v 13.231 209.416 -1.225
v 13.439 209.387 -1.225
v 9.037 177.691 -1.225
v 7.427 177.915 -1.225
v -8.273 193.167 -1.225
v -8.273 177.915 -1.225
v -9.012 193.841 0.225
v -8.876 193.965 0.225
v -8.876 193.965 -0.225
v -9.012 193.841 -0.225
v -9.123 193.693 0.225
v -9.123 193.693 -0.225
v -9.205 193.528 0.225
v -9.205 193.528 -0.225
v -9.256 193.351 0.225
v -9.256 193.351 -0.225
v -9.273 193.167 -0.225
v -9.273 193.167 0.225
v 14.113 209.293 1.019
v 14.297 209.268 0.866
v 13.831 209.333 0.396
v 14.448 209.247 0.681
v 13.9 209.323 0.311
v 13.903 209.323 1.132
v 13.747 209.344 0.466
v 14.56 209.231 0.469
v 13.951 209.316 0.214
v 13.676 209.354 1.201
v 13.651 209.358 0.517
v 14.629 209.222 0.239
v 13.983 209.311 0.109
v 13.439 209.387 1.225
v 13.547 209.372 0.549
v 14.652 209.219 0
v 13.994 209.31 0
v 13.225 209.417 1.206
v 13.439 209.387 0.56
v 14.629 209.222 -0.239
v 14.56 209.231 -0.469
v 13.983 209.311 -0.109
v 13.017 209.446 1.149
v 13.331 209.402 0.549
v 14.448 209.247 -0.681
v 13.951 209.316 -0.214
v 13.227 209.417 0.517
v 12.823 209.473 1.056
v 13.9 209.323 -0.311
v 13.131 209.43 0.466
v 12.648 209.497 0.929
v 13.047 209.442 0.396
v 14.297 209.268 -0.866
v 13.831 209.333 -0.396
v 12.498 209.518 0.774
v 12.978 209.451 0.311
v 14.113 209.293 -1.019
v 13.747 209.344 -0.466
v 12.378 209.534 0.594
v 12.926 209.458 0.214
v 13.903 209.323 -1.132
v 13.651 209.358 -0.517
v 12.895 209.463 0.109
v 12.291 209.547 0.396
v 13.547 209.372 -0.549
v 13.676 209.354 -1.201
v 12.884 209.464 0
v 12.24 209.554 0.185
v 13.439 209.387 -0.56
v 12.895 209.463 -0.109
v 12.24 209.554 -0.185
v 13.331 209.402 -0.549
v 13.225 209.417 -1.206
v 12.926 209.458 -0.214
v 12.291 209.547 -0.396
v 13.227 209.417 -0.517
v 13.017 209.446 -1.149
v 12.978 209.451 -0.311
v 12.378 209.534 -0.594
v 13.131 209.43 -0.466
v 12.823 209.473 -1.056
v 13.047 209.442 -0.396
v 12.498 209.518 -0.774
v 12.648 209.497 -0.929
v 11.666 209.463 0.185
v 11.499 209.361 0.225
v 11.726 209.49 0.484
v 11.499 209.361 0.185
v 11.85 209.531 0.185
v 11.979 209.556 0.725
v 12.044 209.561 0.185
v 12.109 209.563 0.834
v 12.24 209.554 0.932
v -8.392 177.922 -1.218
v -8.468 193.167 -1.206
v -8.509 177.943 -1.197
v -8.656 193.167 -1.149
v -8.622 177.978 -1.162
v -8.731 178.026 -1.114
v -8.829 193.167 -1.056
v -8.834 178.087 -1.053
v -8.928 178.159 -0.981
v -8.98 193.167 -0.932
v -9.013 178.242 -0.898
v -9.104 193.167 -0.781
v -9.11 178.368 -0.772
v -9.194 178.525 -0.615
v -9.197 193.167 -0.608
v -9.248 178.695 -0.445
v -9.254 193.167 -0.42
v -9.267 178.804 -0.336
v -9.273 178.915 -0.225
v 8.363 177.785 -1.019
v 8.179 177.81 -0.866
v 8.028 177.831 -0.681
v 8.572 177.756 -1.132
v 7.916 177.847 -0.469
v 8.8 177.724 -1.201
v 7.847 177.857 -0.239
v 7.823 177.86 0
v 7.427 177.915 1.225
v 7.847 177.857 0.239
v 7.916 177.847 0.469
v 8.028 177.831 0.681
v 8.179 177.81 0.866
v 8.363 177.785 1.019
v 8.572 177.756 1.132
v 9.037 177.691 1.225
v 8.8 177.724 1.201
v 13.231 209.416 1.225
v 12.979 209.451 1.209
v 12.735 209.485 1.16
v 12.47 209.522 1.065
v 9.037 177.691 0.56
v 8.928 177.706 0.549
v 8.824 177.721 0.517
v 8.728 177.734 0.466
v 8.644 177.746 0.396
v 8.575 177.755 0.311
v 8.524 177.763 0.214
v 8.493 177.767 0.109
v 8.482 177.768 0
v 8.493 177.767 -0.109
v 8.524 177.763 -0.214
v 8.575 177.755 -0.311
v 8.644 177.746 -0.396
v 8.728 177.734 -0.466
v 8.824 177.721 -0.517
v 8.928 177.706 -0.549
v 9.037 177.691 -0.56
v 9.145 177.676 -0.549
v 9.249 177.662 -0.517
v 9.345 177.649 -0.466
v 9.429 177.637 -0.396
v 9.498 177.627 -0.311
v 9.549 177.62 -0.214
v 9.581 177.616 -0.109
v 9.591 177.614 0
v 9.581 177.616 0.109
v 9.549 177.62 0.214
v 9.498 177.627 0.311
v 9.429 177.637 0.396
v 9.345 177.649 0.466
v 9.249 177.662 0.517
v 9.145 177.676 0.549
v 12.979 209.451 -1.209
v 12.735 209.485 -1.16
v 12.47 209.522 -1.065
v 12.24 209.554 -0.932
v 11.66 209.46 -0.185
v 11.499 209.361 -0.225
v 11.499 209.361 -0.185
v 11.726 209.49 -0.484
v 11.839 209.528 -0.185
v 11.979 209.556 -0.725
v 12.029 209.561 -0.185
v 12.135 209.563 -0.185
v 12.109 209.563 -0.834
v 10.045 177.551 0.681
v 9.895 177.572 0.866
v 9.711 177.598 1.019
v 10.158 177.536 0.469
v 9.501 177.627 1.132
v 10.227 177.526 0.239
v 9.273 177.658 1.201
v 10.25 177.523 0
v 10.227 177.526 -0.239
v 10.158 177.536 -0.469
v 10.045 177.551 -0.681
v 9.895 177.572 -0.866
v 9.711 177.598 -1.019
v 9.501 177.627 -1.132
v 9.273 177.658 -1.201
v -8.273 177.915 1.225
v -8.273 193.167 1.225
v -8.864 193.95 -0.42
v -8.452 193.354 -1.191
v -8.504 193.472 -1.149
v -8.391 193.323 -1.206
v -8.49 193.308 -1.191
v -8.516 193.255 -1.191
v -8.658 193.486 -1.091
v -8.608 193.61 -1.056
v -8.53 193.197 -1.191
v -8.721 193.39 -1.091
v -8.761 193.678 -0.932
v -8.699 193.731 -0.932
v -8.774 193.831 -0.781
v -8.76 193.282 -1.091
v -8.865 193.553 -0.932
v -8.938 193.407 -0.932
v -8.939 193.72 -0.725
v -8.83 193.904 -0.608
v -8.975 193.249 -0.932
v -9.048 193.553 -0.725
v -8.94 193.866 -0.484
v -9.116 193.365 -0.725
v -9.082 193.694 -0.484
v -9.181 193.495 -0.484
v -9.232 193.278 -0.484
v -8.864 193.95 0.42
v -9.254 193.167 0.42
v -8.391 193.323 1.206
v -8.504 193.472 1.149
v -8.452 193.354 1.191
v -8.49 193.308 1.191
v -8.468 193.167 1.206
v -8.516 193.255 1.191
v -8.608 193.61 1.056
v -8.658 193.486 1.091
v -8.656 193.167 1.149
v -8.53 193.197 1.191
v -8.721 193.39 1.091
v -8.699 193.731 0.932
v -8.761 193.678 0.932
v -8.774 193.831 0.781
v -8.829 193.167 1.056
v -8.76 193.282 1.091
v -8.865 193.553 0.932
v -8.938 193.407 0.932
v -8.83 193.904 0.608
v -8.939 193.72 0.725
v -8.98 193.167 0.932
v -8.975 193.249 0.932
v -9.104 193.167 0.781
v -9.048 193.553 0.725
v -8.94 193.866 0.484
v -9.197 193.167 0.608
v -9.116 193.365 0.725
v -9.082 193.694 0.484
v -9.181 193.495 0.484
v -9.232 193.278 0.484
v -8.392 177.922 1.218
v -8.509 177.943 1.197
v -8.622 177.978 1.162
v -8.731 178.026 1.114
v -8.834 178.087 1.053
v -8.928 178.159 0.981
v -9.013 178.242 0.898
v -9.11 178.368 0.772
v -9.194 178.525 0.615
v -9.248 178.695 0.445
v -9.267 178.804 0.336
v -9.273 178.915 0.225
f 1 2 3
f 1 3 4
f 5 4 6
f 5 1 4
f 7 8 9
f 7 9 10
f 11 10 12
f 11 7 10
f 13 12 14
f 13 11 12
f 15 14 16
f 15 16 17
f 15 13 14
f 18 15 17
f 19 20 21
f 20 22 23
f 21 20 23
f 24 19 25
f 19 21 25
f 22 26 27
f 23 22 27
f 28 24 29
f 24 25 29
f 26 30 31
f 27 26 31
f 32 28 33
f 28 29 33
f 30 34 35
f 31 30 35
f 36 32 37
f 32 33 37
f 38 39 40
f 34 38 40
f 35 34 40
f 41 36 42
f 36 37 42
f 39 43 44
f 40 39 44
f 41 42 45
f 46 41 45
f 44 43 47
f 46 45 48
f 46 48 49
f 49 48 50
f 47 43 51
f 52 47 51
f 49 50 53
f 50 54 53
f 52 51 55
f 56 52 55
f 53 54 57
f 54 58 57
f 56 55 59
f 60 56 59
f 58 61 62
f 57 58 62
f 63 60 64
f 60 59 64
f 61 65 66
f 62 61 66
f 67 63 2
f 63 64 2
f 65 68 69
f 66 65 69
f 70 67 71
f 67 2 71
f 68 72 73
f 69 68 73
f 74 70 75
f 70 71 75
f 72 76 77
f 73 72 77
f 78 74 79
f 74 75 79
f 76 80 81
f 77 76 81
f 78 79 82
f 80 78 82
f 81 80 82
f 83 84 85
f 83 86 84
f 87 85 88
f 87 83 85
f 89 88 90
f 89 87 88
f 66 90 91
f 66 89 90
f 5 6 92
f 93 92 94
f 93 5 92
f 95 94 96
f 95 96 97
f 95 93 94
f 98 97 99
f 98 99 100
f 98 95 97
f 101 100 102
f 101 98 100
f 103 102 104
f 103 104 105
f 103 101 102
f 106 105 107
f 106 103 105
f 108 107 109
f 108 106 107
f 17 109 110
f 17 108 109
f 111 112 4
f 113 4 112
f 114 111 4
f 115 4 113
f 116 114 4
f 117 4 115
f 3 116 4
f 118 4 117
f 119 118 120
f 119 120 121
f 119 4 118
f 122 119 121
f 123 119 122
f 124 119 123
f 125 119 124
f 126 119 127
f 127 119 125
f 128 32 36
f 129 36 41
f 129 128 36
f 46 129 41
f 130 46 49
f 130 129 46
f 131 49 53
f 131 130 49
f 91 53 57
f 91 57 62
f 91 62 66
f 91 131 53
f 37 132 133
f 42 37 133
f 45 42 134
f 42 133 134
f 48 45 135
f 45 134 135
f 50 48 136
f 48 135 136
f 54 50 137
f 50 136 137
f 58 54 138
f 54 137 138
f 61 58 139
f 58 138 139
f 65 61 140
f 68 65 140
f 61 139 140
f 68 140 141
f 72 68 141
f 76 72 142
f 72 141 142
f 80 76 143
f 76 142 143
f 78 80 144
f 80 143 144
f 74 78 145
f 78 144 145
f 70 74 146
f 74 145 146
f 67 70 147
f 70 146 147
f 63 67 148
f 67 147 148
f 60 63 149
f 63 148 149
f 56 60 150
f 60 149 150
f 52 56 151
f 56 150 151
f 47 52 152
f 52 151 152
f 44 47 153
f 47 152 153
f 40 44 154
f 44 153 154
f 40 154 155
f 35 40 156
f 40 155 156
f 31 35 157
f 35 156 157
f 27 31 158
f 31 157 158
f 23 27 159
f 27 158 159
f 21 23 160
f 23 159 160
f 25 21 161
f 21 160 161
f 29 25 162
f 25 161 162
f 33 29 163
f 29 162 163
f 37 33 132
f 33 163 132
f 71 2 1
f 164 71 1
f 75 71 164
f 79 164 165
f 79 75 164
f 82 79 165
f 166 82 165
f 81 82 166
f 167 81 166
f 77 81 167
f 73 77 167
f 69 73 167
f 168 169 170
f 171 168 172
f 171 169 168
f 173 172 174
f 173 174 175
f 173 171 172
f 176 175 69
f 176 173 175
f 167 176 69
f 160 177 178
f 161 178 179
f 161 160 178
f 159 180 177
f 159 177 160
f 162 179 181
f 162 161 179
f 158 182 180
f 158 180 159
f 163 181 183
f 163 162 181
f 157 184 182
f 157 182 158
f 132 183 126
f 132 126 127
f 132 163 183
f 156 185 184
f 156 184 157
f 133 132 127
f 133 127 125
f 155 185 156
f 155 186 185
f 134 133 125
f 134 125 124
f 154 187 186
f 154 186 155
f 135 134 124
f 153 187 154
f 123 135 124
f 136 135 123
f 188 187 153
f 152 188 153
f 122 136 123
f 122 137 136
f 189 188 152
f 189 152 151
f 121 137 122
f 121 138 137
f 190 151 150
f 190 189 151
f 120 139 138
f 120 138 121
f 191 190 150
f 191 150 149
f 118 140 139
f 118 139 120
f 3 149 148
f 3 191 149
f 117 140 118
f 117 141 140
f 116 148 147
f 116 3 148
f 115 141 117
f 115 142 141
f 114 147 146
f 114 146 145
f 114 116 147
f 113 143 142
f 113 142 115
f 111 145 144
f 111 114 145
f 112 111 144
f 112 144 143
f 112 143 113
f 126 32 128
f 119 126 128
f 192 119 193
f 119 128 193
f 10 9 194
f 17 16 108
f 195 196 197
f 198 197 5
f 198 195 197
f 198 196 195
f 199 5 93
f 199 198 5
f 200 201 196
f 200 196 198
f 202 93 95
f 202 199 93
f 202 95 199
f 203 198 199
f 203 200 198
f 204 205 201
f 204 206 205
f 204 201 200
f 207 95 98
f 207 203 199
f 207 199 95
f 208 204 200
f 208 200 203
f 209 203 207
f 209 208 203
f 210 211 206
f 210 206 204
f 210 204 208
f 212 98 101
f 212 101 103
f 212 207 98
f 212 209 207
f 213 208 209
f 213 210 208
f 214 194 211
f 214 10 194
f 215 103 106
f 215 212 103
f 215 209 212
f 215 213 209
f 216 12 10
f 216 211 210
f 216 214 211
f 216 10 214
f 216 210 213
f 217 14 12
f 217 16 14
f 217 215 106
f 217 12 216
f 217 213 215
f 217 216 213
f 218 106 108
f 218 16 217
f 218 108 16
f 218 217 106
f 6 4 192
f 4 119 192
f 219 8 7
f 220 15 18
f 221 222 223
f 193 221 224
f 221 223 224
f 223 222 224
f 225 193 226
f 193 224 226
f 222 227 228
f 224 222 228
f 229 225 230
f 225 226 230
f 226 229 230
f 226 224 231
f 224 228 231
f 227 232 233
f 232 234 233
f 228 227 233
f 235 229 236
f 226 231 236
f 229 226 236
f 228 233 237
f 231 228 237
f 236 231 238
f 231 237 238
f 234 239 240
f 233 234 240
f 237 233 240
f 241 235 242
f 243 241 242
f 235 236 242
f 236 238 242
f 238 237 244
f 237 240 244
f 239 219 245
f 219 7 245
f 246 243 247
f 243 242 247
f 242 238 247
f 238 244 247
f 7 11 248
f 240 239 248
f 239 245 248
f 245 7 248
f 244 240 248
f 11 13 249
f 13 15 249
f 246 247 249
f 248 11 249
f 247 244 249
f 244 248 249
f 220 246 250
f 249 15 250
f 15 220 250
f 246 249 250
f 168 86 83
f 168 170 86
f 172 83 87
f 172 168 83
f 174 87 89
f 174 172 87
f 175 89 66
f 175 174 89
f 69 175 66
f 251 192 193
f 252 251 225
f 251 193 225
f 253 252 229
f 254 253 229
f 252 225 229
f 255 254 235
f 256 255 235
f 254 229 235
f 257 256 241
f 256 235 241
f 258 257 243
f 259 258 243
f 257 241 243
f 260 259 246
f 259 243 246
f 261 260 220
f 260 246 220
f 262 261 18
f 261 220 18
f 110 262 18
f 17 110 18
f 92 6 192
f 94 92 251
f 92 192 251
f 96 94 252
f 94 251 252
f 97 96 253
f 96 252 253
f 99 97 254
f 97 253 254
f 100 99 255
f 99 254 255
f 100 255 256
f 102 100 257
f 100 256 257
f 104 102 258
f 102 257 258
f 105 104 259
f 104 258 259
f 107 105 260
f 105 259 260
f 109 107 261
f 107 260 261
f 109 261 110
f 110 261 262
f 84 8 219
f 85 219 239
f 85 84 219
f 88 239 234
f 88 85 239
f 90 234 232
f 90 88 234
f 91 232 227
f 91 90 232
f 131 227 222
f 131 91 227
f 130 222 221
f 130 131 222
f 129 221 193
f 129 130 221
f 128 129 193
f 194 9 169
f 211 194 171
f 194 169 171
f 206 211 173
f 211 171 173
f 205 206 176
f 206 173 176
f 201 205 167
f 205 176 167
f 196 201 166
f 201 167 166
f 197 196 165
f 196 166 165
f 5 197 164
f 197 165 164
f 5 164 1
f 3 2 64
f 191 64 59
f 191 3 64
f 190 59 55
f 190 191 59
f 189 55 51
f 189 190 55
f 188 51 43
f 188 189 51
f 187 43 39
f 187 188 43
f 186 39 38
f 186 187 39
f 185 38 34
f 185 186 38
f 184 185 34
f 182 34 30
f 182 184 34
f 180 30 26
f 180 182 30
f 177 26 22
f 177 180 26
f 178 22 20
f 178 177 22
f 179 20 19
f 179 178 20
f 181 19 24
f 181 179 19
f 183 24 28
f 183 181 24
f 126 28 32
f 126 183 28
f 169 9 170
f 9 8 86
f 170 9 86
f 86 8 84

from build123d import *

# Parameters (mm, degrees)
SKETCH4_R           = 1.225
SKETCH4_R_2         = 0.56
BOSS_EXTRUDE1_DEPTH = 32
BOSS_EXTRUDE2_DEPTH = 1.225
SKETCH5_R           = 0.56
CUT_EXTRUDE1_DEPTH  = 32
FILLET1_R           = 1


with BuildPart() as part:
    # Sketch4 → Boss-Extrude1 (new body)
    with BuildSketch(Plane(origin=(24.384171153, 175.5596446, 0), x_dir=(-0.990491591, 0.137573282, 0), z_dir=(-0.137573282, -0.990491591, 0))):
        with Locations((15.494896665, 0)):
            Circle(SKETCH4_R)
        with Locations((15.494896665, 0)):
            Circle(SKETCH4_R_2, mode=Mode.SUBTRACT)
    extrude(amount=-BOSS_EXTRUDE1_DEPTH)

    # Sketch2 → Boss-Extrude2 (add, symmetric)
    with BuildSketch(Plane.XY):
        Polygon((-9.272942535, 193.66488497), (11.829402487, 209.610615887), (7.427057465, 177.91488497), (-9.272942535, 177.91488497), align=None)
        Polygon((9.036606301, 177.691328387), (13.438951323, 209.387059303), (11.829402487, 209.610615887), (7.427057465, 177.91488497), align=None)
    extrude(amount=BOSS_EXTRUDE2_DEPTH, both=True)

    # Sketch5 → Cut-Extrude1 (cut)
    with BuildSketch(Plane(origin=(24.384171153, 175.5596446, 0), x_dir=(0.990491591, -0.137573282, 0), z_dir=(-0.137573282, -0.990491591, 0))):
        with Locations((-15.494896665, 0)):
            Circle(SKETCH5_R)
    extrude(amount=-CUT_EXTRUDE1_DEPTH, mode=Mode.SUBTRACT)

    # Fillet1
    fillet1_edges = [part.edges().sort_by_distance(p)[0] for p in [
        (1.278229976, 201.637750428, 1.225),
        (11.829402487, 209.610615887, 0),
        (-9.272942535, 185.78988497, 1.225),
        (-9.272942535, 193.66488497, 0),
        (-9.272942535, 177.91488497, 0),
        (1.278229976, 201.637750428, -1.225),
        (-9.272942535, 185.78988497, -1.225),
    ]]
    fillet(fillet1_edges, radius=FILLET1_R)


solid = part.part
